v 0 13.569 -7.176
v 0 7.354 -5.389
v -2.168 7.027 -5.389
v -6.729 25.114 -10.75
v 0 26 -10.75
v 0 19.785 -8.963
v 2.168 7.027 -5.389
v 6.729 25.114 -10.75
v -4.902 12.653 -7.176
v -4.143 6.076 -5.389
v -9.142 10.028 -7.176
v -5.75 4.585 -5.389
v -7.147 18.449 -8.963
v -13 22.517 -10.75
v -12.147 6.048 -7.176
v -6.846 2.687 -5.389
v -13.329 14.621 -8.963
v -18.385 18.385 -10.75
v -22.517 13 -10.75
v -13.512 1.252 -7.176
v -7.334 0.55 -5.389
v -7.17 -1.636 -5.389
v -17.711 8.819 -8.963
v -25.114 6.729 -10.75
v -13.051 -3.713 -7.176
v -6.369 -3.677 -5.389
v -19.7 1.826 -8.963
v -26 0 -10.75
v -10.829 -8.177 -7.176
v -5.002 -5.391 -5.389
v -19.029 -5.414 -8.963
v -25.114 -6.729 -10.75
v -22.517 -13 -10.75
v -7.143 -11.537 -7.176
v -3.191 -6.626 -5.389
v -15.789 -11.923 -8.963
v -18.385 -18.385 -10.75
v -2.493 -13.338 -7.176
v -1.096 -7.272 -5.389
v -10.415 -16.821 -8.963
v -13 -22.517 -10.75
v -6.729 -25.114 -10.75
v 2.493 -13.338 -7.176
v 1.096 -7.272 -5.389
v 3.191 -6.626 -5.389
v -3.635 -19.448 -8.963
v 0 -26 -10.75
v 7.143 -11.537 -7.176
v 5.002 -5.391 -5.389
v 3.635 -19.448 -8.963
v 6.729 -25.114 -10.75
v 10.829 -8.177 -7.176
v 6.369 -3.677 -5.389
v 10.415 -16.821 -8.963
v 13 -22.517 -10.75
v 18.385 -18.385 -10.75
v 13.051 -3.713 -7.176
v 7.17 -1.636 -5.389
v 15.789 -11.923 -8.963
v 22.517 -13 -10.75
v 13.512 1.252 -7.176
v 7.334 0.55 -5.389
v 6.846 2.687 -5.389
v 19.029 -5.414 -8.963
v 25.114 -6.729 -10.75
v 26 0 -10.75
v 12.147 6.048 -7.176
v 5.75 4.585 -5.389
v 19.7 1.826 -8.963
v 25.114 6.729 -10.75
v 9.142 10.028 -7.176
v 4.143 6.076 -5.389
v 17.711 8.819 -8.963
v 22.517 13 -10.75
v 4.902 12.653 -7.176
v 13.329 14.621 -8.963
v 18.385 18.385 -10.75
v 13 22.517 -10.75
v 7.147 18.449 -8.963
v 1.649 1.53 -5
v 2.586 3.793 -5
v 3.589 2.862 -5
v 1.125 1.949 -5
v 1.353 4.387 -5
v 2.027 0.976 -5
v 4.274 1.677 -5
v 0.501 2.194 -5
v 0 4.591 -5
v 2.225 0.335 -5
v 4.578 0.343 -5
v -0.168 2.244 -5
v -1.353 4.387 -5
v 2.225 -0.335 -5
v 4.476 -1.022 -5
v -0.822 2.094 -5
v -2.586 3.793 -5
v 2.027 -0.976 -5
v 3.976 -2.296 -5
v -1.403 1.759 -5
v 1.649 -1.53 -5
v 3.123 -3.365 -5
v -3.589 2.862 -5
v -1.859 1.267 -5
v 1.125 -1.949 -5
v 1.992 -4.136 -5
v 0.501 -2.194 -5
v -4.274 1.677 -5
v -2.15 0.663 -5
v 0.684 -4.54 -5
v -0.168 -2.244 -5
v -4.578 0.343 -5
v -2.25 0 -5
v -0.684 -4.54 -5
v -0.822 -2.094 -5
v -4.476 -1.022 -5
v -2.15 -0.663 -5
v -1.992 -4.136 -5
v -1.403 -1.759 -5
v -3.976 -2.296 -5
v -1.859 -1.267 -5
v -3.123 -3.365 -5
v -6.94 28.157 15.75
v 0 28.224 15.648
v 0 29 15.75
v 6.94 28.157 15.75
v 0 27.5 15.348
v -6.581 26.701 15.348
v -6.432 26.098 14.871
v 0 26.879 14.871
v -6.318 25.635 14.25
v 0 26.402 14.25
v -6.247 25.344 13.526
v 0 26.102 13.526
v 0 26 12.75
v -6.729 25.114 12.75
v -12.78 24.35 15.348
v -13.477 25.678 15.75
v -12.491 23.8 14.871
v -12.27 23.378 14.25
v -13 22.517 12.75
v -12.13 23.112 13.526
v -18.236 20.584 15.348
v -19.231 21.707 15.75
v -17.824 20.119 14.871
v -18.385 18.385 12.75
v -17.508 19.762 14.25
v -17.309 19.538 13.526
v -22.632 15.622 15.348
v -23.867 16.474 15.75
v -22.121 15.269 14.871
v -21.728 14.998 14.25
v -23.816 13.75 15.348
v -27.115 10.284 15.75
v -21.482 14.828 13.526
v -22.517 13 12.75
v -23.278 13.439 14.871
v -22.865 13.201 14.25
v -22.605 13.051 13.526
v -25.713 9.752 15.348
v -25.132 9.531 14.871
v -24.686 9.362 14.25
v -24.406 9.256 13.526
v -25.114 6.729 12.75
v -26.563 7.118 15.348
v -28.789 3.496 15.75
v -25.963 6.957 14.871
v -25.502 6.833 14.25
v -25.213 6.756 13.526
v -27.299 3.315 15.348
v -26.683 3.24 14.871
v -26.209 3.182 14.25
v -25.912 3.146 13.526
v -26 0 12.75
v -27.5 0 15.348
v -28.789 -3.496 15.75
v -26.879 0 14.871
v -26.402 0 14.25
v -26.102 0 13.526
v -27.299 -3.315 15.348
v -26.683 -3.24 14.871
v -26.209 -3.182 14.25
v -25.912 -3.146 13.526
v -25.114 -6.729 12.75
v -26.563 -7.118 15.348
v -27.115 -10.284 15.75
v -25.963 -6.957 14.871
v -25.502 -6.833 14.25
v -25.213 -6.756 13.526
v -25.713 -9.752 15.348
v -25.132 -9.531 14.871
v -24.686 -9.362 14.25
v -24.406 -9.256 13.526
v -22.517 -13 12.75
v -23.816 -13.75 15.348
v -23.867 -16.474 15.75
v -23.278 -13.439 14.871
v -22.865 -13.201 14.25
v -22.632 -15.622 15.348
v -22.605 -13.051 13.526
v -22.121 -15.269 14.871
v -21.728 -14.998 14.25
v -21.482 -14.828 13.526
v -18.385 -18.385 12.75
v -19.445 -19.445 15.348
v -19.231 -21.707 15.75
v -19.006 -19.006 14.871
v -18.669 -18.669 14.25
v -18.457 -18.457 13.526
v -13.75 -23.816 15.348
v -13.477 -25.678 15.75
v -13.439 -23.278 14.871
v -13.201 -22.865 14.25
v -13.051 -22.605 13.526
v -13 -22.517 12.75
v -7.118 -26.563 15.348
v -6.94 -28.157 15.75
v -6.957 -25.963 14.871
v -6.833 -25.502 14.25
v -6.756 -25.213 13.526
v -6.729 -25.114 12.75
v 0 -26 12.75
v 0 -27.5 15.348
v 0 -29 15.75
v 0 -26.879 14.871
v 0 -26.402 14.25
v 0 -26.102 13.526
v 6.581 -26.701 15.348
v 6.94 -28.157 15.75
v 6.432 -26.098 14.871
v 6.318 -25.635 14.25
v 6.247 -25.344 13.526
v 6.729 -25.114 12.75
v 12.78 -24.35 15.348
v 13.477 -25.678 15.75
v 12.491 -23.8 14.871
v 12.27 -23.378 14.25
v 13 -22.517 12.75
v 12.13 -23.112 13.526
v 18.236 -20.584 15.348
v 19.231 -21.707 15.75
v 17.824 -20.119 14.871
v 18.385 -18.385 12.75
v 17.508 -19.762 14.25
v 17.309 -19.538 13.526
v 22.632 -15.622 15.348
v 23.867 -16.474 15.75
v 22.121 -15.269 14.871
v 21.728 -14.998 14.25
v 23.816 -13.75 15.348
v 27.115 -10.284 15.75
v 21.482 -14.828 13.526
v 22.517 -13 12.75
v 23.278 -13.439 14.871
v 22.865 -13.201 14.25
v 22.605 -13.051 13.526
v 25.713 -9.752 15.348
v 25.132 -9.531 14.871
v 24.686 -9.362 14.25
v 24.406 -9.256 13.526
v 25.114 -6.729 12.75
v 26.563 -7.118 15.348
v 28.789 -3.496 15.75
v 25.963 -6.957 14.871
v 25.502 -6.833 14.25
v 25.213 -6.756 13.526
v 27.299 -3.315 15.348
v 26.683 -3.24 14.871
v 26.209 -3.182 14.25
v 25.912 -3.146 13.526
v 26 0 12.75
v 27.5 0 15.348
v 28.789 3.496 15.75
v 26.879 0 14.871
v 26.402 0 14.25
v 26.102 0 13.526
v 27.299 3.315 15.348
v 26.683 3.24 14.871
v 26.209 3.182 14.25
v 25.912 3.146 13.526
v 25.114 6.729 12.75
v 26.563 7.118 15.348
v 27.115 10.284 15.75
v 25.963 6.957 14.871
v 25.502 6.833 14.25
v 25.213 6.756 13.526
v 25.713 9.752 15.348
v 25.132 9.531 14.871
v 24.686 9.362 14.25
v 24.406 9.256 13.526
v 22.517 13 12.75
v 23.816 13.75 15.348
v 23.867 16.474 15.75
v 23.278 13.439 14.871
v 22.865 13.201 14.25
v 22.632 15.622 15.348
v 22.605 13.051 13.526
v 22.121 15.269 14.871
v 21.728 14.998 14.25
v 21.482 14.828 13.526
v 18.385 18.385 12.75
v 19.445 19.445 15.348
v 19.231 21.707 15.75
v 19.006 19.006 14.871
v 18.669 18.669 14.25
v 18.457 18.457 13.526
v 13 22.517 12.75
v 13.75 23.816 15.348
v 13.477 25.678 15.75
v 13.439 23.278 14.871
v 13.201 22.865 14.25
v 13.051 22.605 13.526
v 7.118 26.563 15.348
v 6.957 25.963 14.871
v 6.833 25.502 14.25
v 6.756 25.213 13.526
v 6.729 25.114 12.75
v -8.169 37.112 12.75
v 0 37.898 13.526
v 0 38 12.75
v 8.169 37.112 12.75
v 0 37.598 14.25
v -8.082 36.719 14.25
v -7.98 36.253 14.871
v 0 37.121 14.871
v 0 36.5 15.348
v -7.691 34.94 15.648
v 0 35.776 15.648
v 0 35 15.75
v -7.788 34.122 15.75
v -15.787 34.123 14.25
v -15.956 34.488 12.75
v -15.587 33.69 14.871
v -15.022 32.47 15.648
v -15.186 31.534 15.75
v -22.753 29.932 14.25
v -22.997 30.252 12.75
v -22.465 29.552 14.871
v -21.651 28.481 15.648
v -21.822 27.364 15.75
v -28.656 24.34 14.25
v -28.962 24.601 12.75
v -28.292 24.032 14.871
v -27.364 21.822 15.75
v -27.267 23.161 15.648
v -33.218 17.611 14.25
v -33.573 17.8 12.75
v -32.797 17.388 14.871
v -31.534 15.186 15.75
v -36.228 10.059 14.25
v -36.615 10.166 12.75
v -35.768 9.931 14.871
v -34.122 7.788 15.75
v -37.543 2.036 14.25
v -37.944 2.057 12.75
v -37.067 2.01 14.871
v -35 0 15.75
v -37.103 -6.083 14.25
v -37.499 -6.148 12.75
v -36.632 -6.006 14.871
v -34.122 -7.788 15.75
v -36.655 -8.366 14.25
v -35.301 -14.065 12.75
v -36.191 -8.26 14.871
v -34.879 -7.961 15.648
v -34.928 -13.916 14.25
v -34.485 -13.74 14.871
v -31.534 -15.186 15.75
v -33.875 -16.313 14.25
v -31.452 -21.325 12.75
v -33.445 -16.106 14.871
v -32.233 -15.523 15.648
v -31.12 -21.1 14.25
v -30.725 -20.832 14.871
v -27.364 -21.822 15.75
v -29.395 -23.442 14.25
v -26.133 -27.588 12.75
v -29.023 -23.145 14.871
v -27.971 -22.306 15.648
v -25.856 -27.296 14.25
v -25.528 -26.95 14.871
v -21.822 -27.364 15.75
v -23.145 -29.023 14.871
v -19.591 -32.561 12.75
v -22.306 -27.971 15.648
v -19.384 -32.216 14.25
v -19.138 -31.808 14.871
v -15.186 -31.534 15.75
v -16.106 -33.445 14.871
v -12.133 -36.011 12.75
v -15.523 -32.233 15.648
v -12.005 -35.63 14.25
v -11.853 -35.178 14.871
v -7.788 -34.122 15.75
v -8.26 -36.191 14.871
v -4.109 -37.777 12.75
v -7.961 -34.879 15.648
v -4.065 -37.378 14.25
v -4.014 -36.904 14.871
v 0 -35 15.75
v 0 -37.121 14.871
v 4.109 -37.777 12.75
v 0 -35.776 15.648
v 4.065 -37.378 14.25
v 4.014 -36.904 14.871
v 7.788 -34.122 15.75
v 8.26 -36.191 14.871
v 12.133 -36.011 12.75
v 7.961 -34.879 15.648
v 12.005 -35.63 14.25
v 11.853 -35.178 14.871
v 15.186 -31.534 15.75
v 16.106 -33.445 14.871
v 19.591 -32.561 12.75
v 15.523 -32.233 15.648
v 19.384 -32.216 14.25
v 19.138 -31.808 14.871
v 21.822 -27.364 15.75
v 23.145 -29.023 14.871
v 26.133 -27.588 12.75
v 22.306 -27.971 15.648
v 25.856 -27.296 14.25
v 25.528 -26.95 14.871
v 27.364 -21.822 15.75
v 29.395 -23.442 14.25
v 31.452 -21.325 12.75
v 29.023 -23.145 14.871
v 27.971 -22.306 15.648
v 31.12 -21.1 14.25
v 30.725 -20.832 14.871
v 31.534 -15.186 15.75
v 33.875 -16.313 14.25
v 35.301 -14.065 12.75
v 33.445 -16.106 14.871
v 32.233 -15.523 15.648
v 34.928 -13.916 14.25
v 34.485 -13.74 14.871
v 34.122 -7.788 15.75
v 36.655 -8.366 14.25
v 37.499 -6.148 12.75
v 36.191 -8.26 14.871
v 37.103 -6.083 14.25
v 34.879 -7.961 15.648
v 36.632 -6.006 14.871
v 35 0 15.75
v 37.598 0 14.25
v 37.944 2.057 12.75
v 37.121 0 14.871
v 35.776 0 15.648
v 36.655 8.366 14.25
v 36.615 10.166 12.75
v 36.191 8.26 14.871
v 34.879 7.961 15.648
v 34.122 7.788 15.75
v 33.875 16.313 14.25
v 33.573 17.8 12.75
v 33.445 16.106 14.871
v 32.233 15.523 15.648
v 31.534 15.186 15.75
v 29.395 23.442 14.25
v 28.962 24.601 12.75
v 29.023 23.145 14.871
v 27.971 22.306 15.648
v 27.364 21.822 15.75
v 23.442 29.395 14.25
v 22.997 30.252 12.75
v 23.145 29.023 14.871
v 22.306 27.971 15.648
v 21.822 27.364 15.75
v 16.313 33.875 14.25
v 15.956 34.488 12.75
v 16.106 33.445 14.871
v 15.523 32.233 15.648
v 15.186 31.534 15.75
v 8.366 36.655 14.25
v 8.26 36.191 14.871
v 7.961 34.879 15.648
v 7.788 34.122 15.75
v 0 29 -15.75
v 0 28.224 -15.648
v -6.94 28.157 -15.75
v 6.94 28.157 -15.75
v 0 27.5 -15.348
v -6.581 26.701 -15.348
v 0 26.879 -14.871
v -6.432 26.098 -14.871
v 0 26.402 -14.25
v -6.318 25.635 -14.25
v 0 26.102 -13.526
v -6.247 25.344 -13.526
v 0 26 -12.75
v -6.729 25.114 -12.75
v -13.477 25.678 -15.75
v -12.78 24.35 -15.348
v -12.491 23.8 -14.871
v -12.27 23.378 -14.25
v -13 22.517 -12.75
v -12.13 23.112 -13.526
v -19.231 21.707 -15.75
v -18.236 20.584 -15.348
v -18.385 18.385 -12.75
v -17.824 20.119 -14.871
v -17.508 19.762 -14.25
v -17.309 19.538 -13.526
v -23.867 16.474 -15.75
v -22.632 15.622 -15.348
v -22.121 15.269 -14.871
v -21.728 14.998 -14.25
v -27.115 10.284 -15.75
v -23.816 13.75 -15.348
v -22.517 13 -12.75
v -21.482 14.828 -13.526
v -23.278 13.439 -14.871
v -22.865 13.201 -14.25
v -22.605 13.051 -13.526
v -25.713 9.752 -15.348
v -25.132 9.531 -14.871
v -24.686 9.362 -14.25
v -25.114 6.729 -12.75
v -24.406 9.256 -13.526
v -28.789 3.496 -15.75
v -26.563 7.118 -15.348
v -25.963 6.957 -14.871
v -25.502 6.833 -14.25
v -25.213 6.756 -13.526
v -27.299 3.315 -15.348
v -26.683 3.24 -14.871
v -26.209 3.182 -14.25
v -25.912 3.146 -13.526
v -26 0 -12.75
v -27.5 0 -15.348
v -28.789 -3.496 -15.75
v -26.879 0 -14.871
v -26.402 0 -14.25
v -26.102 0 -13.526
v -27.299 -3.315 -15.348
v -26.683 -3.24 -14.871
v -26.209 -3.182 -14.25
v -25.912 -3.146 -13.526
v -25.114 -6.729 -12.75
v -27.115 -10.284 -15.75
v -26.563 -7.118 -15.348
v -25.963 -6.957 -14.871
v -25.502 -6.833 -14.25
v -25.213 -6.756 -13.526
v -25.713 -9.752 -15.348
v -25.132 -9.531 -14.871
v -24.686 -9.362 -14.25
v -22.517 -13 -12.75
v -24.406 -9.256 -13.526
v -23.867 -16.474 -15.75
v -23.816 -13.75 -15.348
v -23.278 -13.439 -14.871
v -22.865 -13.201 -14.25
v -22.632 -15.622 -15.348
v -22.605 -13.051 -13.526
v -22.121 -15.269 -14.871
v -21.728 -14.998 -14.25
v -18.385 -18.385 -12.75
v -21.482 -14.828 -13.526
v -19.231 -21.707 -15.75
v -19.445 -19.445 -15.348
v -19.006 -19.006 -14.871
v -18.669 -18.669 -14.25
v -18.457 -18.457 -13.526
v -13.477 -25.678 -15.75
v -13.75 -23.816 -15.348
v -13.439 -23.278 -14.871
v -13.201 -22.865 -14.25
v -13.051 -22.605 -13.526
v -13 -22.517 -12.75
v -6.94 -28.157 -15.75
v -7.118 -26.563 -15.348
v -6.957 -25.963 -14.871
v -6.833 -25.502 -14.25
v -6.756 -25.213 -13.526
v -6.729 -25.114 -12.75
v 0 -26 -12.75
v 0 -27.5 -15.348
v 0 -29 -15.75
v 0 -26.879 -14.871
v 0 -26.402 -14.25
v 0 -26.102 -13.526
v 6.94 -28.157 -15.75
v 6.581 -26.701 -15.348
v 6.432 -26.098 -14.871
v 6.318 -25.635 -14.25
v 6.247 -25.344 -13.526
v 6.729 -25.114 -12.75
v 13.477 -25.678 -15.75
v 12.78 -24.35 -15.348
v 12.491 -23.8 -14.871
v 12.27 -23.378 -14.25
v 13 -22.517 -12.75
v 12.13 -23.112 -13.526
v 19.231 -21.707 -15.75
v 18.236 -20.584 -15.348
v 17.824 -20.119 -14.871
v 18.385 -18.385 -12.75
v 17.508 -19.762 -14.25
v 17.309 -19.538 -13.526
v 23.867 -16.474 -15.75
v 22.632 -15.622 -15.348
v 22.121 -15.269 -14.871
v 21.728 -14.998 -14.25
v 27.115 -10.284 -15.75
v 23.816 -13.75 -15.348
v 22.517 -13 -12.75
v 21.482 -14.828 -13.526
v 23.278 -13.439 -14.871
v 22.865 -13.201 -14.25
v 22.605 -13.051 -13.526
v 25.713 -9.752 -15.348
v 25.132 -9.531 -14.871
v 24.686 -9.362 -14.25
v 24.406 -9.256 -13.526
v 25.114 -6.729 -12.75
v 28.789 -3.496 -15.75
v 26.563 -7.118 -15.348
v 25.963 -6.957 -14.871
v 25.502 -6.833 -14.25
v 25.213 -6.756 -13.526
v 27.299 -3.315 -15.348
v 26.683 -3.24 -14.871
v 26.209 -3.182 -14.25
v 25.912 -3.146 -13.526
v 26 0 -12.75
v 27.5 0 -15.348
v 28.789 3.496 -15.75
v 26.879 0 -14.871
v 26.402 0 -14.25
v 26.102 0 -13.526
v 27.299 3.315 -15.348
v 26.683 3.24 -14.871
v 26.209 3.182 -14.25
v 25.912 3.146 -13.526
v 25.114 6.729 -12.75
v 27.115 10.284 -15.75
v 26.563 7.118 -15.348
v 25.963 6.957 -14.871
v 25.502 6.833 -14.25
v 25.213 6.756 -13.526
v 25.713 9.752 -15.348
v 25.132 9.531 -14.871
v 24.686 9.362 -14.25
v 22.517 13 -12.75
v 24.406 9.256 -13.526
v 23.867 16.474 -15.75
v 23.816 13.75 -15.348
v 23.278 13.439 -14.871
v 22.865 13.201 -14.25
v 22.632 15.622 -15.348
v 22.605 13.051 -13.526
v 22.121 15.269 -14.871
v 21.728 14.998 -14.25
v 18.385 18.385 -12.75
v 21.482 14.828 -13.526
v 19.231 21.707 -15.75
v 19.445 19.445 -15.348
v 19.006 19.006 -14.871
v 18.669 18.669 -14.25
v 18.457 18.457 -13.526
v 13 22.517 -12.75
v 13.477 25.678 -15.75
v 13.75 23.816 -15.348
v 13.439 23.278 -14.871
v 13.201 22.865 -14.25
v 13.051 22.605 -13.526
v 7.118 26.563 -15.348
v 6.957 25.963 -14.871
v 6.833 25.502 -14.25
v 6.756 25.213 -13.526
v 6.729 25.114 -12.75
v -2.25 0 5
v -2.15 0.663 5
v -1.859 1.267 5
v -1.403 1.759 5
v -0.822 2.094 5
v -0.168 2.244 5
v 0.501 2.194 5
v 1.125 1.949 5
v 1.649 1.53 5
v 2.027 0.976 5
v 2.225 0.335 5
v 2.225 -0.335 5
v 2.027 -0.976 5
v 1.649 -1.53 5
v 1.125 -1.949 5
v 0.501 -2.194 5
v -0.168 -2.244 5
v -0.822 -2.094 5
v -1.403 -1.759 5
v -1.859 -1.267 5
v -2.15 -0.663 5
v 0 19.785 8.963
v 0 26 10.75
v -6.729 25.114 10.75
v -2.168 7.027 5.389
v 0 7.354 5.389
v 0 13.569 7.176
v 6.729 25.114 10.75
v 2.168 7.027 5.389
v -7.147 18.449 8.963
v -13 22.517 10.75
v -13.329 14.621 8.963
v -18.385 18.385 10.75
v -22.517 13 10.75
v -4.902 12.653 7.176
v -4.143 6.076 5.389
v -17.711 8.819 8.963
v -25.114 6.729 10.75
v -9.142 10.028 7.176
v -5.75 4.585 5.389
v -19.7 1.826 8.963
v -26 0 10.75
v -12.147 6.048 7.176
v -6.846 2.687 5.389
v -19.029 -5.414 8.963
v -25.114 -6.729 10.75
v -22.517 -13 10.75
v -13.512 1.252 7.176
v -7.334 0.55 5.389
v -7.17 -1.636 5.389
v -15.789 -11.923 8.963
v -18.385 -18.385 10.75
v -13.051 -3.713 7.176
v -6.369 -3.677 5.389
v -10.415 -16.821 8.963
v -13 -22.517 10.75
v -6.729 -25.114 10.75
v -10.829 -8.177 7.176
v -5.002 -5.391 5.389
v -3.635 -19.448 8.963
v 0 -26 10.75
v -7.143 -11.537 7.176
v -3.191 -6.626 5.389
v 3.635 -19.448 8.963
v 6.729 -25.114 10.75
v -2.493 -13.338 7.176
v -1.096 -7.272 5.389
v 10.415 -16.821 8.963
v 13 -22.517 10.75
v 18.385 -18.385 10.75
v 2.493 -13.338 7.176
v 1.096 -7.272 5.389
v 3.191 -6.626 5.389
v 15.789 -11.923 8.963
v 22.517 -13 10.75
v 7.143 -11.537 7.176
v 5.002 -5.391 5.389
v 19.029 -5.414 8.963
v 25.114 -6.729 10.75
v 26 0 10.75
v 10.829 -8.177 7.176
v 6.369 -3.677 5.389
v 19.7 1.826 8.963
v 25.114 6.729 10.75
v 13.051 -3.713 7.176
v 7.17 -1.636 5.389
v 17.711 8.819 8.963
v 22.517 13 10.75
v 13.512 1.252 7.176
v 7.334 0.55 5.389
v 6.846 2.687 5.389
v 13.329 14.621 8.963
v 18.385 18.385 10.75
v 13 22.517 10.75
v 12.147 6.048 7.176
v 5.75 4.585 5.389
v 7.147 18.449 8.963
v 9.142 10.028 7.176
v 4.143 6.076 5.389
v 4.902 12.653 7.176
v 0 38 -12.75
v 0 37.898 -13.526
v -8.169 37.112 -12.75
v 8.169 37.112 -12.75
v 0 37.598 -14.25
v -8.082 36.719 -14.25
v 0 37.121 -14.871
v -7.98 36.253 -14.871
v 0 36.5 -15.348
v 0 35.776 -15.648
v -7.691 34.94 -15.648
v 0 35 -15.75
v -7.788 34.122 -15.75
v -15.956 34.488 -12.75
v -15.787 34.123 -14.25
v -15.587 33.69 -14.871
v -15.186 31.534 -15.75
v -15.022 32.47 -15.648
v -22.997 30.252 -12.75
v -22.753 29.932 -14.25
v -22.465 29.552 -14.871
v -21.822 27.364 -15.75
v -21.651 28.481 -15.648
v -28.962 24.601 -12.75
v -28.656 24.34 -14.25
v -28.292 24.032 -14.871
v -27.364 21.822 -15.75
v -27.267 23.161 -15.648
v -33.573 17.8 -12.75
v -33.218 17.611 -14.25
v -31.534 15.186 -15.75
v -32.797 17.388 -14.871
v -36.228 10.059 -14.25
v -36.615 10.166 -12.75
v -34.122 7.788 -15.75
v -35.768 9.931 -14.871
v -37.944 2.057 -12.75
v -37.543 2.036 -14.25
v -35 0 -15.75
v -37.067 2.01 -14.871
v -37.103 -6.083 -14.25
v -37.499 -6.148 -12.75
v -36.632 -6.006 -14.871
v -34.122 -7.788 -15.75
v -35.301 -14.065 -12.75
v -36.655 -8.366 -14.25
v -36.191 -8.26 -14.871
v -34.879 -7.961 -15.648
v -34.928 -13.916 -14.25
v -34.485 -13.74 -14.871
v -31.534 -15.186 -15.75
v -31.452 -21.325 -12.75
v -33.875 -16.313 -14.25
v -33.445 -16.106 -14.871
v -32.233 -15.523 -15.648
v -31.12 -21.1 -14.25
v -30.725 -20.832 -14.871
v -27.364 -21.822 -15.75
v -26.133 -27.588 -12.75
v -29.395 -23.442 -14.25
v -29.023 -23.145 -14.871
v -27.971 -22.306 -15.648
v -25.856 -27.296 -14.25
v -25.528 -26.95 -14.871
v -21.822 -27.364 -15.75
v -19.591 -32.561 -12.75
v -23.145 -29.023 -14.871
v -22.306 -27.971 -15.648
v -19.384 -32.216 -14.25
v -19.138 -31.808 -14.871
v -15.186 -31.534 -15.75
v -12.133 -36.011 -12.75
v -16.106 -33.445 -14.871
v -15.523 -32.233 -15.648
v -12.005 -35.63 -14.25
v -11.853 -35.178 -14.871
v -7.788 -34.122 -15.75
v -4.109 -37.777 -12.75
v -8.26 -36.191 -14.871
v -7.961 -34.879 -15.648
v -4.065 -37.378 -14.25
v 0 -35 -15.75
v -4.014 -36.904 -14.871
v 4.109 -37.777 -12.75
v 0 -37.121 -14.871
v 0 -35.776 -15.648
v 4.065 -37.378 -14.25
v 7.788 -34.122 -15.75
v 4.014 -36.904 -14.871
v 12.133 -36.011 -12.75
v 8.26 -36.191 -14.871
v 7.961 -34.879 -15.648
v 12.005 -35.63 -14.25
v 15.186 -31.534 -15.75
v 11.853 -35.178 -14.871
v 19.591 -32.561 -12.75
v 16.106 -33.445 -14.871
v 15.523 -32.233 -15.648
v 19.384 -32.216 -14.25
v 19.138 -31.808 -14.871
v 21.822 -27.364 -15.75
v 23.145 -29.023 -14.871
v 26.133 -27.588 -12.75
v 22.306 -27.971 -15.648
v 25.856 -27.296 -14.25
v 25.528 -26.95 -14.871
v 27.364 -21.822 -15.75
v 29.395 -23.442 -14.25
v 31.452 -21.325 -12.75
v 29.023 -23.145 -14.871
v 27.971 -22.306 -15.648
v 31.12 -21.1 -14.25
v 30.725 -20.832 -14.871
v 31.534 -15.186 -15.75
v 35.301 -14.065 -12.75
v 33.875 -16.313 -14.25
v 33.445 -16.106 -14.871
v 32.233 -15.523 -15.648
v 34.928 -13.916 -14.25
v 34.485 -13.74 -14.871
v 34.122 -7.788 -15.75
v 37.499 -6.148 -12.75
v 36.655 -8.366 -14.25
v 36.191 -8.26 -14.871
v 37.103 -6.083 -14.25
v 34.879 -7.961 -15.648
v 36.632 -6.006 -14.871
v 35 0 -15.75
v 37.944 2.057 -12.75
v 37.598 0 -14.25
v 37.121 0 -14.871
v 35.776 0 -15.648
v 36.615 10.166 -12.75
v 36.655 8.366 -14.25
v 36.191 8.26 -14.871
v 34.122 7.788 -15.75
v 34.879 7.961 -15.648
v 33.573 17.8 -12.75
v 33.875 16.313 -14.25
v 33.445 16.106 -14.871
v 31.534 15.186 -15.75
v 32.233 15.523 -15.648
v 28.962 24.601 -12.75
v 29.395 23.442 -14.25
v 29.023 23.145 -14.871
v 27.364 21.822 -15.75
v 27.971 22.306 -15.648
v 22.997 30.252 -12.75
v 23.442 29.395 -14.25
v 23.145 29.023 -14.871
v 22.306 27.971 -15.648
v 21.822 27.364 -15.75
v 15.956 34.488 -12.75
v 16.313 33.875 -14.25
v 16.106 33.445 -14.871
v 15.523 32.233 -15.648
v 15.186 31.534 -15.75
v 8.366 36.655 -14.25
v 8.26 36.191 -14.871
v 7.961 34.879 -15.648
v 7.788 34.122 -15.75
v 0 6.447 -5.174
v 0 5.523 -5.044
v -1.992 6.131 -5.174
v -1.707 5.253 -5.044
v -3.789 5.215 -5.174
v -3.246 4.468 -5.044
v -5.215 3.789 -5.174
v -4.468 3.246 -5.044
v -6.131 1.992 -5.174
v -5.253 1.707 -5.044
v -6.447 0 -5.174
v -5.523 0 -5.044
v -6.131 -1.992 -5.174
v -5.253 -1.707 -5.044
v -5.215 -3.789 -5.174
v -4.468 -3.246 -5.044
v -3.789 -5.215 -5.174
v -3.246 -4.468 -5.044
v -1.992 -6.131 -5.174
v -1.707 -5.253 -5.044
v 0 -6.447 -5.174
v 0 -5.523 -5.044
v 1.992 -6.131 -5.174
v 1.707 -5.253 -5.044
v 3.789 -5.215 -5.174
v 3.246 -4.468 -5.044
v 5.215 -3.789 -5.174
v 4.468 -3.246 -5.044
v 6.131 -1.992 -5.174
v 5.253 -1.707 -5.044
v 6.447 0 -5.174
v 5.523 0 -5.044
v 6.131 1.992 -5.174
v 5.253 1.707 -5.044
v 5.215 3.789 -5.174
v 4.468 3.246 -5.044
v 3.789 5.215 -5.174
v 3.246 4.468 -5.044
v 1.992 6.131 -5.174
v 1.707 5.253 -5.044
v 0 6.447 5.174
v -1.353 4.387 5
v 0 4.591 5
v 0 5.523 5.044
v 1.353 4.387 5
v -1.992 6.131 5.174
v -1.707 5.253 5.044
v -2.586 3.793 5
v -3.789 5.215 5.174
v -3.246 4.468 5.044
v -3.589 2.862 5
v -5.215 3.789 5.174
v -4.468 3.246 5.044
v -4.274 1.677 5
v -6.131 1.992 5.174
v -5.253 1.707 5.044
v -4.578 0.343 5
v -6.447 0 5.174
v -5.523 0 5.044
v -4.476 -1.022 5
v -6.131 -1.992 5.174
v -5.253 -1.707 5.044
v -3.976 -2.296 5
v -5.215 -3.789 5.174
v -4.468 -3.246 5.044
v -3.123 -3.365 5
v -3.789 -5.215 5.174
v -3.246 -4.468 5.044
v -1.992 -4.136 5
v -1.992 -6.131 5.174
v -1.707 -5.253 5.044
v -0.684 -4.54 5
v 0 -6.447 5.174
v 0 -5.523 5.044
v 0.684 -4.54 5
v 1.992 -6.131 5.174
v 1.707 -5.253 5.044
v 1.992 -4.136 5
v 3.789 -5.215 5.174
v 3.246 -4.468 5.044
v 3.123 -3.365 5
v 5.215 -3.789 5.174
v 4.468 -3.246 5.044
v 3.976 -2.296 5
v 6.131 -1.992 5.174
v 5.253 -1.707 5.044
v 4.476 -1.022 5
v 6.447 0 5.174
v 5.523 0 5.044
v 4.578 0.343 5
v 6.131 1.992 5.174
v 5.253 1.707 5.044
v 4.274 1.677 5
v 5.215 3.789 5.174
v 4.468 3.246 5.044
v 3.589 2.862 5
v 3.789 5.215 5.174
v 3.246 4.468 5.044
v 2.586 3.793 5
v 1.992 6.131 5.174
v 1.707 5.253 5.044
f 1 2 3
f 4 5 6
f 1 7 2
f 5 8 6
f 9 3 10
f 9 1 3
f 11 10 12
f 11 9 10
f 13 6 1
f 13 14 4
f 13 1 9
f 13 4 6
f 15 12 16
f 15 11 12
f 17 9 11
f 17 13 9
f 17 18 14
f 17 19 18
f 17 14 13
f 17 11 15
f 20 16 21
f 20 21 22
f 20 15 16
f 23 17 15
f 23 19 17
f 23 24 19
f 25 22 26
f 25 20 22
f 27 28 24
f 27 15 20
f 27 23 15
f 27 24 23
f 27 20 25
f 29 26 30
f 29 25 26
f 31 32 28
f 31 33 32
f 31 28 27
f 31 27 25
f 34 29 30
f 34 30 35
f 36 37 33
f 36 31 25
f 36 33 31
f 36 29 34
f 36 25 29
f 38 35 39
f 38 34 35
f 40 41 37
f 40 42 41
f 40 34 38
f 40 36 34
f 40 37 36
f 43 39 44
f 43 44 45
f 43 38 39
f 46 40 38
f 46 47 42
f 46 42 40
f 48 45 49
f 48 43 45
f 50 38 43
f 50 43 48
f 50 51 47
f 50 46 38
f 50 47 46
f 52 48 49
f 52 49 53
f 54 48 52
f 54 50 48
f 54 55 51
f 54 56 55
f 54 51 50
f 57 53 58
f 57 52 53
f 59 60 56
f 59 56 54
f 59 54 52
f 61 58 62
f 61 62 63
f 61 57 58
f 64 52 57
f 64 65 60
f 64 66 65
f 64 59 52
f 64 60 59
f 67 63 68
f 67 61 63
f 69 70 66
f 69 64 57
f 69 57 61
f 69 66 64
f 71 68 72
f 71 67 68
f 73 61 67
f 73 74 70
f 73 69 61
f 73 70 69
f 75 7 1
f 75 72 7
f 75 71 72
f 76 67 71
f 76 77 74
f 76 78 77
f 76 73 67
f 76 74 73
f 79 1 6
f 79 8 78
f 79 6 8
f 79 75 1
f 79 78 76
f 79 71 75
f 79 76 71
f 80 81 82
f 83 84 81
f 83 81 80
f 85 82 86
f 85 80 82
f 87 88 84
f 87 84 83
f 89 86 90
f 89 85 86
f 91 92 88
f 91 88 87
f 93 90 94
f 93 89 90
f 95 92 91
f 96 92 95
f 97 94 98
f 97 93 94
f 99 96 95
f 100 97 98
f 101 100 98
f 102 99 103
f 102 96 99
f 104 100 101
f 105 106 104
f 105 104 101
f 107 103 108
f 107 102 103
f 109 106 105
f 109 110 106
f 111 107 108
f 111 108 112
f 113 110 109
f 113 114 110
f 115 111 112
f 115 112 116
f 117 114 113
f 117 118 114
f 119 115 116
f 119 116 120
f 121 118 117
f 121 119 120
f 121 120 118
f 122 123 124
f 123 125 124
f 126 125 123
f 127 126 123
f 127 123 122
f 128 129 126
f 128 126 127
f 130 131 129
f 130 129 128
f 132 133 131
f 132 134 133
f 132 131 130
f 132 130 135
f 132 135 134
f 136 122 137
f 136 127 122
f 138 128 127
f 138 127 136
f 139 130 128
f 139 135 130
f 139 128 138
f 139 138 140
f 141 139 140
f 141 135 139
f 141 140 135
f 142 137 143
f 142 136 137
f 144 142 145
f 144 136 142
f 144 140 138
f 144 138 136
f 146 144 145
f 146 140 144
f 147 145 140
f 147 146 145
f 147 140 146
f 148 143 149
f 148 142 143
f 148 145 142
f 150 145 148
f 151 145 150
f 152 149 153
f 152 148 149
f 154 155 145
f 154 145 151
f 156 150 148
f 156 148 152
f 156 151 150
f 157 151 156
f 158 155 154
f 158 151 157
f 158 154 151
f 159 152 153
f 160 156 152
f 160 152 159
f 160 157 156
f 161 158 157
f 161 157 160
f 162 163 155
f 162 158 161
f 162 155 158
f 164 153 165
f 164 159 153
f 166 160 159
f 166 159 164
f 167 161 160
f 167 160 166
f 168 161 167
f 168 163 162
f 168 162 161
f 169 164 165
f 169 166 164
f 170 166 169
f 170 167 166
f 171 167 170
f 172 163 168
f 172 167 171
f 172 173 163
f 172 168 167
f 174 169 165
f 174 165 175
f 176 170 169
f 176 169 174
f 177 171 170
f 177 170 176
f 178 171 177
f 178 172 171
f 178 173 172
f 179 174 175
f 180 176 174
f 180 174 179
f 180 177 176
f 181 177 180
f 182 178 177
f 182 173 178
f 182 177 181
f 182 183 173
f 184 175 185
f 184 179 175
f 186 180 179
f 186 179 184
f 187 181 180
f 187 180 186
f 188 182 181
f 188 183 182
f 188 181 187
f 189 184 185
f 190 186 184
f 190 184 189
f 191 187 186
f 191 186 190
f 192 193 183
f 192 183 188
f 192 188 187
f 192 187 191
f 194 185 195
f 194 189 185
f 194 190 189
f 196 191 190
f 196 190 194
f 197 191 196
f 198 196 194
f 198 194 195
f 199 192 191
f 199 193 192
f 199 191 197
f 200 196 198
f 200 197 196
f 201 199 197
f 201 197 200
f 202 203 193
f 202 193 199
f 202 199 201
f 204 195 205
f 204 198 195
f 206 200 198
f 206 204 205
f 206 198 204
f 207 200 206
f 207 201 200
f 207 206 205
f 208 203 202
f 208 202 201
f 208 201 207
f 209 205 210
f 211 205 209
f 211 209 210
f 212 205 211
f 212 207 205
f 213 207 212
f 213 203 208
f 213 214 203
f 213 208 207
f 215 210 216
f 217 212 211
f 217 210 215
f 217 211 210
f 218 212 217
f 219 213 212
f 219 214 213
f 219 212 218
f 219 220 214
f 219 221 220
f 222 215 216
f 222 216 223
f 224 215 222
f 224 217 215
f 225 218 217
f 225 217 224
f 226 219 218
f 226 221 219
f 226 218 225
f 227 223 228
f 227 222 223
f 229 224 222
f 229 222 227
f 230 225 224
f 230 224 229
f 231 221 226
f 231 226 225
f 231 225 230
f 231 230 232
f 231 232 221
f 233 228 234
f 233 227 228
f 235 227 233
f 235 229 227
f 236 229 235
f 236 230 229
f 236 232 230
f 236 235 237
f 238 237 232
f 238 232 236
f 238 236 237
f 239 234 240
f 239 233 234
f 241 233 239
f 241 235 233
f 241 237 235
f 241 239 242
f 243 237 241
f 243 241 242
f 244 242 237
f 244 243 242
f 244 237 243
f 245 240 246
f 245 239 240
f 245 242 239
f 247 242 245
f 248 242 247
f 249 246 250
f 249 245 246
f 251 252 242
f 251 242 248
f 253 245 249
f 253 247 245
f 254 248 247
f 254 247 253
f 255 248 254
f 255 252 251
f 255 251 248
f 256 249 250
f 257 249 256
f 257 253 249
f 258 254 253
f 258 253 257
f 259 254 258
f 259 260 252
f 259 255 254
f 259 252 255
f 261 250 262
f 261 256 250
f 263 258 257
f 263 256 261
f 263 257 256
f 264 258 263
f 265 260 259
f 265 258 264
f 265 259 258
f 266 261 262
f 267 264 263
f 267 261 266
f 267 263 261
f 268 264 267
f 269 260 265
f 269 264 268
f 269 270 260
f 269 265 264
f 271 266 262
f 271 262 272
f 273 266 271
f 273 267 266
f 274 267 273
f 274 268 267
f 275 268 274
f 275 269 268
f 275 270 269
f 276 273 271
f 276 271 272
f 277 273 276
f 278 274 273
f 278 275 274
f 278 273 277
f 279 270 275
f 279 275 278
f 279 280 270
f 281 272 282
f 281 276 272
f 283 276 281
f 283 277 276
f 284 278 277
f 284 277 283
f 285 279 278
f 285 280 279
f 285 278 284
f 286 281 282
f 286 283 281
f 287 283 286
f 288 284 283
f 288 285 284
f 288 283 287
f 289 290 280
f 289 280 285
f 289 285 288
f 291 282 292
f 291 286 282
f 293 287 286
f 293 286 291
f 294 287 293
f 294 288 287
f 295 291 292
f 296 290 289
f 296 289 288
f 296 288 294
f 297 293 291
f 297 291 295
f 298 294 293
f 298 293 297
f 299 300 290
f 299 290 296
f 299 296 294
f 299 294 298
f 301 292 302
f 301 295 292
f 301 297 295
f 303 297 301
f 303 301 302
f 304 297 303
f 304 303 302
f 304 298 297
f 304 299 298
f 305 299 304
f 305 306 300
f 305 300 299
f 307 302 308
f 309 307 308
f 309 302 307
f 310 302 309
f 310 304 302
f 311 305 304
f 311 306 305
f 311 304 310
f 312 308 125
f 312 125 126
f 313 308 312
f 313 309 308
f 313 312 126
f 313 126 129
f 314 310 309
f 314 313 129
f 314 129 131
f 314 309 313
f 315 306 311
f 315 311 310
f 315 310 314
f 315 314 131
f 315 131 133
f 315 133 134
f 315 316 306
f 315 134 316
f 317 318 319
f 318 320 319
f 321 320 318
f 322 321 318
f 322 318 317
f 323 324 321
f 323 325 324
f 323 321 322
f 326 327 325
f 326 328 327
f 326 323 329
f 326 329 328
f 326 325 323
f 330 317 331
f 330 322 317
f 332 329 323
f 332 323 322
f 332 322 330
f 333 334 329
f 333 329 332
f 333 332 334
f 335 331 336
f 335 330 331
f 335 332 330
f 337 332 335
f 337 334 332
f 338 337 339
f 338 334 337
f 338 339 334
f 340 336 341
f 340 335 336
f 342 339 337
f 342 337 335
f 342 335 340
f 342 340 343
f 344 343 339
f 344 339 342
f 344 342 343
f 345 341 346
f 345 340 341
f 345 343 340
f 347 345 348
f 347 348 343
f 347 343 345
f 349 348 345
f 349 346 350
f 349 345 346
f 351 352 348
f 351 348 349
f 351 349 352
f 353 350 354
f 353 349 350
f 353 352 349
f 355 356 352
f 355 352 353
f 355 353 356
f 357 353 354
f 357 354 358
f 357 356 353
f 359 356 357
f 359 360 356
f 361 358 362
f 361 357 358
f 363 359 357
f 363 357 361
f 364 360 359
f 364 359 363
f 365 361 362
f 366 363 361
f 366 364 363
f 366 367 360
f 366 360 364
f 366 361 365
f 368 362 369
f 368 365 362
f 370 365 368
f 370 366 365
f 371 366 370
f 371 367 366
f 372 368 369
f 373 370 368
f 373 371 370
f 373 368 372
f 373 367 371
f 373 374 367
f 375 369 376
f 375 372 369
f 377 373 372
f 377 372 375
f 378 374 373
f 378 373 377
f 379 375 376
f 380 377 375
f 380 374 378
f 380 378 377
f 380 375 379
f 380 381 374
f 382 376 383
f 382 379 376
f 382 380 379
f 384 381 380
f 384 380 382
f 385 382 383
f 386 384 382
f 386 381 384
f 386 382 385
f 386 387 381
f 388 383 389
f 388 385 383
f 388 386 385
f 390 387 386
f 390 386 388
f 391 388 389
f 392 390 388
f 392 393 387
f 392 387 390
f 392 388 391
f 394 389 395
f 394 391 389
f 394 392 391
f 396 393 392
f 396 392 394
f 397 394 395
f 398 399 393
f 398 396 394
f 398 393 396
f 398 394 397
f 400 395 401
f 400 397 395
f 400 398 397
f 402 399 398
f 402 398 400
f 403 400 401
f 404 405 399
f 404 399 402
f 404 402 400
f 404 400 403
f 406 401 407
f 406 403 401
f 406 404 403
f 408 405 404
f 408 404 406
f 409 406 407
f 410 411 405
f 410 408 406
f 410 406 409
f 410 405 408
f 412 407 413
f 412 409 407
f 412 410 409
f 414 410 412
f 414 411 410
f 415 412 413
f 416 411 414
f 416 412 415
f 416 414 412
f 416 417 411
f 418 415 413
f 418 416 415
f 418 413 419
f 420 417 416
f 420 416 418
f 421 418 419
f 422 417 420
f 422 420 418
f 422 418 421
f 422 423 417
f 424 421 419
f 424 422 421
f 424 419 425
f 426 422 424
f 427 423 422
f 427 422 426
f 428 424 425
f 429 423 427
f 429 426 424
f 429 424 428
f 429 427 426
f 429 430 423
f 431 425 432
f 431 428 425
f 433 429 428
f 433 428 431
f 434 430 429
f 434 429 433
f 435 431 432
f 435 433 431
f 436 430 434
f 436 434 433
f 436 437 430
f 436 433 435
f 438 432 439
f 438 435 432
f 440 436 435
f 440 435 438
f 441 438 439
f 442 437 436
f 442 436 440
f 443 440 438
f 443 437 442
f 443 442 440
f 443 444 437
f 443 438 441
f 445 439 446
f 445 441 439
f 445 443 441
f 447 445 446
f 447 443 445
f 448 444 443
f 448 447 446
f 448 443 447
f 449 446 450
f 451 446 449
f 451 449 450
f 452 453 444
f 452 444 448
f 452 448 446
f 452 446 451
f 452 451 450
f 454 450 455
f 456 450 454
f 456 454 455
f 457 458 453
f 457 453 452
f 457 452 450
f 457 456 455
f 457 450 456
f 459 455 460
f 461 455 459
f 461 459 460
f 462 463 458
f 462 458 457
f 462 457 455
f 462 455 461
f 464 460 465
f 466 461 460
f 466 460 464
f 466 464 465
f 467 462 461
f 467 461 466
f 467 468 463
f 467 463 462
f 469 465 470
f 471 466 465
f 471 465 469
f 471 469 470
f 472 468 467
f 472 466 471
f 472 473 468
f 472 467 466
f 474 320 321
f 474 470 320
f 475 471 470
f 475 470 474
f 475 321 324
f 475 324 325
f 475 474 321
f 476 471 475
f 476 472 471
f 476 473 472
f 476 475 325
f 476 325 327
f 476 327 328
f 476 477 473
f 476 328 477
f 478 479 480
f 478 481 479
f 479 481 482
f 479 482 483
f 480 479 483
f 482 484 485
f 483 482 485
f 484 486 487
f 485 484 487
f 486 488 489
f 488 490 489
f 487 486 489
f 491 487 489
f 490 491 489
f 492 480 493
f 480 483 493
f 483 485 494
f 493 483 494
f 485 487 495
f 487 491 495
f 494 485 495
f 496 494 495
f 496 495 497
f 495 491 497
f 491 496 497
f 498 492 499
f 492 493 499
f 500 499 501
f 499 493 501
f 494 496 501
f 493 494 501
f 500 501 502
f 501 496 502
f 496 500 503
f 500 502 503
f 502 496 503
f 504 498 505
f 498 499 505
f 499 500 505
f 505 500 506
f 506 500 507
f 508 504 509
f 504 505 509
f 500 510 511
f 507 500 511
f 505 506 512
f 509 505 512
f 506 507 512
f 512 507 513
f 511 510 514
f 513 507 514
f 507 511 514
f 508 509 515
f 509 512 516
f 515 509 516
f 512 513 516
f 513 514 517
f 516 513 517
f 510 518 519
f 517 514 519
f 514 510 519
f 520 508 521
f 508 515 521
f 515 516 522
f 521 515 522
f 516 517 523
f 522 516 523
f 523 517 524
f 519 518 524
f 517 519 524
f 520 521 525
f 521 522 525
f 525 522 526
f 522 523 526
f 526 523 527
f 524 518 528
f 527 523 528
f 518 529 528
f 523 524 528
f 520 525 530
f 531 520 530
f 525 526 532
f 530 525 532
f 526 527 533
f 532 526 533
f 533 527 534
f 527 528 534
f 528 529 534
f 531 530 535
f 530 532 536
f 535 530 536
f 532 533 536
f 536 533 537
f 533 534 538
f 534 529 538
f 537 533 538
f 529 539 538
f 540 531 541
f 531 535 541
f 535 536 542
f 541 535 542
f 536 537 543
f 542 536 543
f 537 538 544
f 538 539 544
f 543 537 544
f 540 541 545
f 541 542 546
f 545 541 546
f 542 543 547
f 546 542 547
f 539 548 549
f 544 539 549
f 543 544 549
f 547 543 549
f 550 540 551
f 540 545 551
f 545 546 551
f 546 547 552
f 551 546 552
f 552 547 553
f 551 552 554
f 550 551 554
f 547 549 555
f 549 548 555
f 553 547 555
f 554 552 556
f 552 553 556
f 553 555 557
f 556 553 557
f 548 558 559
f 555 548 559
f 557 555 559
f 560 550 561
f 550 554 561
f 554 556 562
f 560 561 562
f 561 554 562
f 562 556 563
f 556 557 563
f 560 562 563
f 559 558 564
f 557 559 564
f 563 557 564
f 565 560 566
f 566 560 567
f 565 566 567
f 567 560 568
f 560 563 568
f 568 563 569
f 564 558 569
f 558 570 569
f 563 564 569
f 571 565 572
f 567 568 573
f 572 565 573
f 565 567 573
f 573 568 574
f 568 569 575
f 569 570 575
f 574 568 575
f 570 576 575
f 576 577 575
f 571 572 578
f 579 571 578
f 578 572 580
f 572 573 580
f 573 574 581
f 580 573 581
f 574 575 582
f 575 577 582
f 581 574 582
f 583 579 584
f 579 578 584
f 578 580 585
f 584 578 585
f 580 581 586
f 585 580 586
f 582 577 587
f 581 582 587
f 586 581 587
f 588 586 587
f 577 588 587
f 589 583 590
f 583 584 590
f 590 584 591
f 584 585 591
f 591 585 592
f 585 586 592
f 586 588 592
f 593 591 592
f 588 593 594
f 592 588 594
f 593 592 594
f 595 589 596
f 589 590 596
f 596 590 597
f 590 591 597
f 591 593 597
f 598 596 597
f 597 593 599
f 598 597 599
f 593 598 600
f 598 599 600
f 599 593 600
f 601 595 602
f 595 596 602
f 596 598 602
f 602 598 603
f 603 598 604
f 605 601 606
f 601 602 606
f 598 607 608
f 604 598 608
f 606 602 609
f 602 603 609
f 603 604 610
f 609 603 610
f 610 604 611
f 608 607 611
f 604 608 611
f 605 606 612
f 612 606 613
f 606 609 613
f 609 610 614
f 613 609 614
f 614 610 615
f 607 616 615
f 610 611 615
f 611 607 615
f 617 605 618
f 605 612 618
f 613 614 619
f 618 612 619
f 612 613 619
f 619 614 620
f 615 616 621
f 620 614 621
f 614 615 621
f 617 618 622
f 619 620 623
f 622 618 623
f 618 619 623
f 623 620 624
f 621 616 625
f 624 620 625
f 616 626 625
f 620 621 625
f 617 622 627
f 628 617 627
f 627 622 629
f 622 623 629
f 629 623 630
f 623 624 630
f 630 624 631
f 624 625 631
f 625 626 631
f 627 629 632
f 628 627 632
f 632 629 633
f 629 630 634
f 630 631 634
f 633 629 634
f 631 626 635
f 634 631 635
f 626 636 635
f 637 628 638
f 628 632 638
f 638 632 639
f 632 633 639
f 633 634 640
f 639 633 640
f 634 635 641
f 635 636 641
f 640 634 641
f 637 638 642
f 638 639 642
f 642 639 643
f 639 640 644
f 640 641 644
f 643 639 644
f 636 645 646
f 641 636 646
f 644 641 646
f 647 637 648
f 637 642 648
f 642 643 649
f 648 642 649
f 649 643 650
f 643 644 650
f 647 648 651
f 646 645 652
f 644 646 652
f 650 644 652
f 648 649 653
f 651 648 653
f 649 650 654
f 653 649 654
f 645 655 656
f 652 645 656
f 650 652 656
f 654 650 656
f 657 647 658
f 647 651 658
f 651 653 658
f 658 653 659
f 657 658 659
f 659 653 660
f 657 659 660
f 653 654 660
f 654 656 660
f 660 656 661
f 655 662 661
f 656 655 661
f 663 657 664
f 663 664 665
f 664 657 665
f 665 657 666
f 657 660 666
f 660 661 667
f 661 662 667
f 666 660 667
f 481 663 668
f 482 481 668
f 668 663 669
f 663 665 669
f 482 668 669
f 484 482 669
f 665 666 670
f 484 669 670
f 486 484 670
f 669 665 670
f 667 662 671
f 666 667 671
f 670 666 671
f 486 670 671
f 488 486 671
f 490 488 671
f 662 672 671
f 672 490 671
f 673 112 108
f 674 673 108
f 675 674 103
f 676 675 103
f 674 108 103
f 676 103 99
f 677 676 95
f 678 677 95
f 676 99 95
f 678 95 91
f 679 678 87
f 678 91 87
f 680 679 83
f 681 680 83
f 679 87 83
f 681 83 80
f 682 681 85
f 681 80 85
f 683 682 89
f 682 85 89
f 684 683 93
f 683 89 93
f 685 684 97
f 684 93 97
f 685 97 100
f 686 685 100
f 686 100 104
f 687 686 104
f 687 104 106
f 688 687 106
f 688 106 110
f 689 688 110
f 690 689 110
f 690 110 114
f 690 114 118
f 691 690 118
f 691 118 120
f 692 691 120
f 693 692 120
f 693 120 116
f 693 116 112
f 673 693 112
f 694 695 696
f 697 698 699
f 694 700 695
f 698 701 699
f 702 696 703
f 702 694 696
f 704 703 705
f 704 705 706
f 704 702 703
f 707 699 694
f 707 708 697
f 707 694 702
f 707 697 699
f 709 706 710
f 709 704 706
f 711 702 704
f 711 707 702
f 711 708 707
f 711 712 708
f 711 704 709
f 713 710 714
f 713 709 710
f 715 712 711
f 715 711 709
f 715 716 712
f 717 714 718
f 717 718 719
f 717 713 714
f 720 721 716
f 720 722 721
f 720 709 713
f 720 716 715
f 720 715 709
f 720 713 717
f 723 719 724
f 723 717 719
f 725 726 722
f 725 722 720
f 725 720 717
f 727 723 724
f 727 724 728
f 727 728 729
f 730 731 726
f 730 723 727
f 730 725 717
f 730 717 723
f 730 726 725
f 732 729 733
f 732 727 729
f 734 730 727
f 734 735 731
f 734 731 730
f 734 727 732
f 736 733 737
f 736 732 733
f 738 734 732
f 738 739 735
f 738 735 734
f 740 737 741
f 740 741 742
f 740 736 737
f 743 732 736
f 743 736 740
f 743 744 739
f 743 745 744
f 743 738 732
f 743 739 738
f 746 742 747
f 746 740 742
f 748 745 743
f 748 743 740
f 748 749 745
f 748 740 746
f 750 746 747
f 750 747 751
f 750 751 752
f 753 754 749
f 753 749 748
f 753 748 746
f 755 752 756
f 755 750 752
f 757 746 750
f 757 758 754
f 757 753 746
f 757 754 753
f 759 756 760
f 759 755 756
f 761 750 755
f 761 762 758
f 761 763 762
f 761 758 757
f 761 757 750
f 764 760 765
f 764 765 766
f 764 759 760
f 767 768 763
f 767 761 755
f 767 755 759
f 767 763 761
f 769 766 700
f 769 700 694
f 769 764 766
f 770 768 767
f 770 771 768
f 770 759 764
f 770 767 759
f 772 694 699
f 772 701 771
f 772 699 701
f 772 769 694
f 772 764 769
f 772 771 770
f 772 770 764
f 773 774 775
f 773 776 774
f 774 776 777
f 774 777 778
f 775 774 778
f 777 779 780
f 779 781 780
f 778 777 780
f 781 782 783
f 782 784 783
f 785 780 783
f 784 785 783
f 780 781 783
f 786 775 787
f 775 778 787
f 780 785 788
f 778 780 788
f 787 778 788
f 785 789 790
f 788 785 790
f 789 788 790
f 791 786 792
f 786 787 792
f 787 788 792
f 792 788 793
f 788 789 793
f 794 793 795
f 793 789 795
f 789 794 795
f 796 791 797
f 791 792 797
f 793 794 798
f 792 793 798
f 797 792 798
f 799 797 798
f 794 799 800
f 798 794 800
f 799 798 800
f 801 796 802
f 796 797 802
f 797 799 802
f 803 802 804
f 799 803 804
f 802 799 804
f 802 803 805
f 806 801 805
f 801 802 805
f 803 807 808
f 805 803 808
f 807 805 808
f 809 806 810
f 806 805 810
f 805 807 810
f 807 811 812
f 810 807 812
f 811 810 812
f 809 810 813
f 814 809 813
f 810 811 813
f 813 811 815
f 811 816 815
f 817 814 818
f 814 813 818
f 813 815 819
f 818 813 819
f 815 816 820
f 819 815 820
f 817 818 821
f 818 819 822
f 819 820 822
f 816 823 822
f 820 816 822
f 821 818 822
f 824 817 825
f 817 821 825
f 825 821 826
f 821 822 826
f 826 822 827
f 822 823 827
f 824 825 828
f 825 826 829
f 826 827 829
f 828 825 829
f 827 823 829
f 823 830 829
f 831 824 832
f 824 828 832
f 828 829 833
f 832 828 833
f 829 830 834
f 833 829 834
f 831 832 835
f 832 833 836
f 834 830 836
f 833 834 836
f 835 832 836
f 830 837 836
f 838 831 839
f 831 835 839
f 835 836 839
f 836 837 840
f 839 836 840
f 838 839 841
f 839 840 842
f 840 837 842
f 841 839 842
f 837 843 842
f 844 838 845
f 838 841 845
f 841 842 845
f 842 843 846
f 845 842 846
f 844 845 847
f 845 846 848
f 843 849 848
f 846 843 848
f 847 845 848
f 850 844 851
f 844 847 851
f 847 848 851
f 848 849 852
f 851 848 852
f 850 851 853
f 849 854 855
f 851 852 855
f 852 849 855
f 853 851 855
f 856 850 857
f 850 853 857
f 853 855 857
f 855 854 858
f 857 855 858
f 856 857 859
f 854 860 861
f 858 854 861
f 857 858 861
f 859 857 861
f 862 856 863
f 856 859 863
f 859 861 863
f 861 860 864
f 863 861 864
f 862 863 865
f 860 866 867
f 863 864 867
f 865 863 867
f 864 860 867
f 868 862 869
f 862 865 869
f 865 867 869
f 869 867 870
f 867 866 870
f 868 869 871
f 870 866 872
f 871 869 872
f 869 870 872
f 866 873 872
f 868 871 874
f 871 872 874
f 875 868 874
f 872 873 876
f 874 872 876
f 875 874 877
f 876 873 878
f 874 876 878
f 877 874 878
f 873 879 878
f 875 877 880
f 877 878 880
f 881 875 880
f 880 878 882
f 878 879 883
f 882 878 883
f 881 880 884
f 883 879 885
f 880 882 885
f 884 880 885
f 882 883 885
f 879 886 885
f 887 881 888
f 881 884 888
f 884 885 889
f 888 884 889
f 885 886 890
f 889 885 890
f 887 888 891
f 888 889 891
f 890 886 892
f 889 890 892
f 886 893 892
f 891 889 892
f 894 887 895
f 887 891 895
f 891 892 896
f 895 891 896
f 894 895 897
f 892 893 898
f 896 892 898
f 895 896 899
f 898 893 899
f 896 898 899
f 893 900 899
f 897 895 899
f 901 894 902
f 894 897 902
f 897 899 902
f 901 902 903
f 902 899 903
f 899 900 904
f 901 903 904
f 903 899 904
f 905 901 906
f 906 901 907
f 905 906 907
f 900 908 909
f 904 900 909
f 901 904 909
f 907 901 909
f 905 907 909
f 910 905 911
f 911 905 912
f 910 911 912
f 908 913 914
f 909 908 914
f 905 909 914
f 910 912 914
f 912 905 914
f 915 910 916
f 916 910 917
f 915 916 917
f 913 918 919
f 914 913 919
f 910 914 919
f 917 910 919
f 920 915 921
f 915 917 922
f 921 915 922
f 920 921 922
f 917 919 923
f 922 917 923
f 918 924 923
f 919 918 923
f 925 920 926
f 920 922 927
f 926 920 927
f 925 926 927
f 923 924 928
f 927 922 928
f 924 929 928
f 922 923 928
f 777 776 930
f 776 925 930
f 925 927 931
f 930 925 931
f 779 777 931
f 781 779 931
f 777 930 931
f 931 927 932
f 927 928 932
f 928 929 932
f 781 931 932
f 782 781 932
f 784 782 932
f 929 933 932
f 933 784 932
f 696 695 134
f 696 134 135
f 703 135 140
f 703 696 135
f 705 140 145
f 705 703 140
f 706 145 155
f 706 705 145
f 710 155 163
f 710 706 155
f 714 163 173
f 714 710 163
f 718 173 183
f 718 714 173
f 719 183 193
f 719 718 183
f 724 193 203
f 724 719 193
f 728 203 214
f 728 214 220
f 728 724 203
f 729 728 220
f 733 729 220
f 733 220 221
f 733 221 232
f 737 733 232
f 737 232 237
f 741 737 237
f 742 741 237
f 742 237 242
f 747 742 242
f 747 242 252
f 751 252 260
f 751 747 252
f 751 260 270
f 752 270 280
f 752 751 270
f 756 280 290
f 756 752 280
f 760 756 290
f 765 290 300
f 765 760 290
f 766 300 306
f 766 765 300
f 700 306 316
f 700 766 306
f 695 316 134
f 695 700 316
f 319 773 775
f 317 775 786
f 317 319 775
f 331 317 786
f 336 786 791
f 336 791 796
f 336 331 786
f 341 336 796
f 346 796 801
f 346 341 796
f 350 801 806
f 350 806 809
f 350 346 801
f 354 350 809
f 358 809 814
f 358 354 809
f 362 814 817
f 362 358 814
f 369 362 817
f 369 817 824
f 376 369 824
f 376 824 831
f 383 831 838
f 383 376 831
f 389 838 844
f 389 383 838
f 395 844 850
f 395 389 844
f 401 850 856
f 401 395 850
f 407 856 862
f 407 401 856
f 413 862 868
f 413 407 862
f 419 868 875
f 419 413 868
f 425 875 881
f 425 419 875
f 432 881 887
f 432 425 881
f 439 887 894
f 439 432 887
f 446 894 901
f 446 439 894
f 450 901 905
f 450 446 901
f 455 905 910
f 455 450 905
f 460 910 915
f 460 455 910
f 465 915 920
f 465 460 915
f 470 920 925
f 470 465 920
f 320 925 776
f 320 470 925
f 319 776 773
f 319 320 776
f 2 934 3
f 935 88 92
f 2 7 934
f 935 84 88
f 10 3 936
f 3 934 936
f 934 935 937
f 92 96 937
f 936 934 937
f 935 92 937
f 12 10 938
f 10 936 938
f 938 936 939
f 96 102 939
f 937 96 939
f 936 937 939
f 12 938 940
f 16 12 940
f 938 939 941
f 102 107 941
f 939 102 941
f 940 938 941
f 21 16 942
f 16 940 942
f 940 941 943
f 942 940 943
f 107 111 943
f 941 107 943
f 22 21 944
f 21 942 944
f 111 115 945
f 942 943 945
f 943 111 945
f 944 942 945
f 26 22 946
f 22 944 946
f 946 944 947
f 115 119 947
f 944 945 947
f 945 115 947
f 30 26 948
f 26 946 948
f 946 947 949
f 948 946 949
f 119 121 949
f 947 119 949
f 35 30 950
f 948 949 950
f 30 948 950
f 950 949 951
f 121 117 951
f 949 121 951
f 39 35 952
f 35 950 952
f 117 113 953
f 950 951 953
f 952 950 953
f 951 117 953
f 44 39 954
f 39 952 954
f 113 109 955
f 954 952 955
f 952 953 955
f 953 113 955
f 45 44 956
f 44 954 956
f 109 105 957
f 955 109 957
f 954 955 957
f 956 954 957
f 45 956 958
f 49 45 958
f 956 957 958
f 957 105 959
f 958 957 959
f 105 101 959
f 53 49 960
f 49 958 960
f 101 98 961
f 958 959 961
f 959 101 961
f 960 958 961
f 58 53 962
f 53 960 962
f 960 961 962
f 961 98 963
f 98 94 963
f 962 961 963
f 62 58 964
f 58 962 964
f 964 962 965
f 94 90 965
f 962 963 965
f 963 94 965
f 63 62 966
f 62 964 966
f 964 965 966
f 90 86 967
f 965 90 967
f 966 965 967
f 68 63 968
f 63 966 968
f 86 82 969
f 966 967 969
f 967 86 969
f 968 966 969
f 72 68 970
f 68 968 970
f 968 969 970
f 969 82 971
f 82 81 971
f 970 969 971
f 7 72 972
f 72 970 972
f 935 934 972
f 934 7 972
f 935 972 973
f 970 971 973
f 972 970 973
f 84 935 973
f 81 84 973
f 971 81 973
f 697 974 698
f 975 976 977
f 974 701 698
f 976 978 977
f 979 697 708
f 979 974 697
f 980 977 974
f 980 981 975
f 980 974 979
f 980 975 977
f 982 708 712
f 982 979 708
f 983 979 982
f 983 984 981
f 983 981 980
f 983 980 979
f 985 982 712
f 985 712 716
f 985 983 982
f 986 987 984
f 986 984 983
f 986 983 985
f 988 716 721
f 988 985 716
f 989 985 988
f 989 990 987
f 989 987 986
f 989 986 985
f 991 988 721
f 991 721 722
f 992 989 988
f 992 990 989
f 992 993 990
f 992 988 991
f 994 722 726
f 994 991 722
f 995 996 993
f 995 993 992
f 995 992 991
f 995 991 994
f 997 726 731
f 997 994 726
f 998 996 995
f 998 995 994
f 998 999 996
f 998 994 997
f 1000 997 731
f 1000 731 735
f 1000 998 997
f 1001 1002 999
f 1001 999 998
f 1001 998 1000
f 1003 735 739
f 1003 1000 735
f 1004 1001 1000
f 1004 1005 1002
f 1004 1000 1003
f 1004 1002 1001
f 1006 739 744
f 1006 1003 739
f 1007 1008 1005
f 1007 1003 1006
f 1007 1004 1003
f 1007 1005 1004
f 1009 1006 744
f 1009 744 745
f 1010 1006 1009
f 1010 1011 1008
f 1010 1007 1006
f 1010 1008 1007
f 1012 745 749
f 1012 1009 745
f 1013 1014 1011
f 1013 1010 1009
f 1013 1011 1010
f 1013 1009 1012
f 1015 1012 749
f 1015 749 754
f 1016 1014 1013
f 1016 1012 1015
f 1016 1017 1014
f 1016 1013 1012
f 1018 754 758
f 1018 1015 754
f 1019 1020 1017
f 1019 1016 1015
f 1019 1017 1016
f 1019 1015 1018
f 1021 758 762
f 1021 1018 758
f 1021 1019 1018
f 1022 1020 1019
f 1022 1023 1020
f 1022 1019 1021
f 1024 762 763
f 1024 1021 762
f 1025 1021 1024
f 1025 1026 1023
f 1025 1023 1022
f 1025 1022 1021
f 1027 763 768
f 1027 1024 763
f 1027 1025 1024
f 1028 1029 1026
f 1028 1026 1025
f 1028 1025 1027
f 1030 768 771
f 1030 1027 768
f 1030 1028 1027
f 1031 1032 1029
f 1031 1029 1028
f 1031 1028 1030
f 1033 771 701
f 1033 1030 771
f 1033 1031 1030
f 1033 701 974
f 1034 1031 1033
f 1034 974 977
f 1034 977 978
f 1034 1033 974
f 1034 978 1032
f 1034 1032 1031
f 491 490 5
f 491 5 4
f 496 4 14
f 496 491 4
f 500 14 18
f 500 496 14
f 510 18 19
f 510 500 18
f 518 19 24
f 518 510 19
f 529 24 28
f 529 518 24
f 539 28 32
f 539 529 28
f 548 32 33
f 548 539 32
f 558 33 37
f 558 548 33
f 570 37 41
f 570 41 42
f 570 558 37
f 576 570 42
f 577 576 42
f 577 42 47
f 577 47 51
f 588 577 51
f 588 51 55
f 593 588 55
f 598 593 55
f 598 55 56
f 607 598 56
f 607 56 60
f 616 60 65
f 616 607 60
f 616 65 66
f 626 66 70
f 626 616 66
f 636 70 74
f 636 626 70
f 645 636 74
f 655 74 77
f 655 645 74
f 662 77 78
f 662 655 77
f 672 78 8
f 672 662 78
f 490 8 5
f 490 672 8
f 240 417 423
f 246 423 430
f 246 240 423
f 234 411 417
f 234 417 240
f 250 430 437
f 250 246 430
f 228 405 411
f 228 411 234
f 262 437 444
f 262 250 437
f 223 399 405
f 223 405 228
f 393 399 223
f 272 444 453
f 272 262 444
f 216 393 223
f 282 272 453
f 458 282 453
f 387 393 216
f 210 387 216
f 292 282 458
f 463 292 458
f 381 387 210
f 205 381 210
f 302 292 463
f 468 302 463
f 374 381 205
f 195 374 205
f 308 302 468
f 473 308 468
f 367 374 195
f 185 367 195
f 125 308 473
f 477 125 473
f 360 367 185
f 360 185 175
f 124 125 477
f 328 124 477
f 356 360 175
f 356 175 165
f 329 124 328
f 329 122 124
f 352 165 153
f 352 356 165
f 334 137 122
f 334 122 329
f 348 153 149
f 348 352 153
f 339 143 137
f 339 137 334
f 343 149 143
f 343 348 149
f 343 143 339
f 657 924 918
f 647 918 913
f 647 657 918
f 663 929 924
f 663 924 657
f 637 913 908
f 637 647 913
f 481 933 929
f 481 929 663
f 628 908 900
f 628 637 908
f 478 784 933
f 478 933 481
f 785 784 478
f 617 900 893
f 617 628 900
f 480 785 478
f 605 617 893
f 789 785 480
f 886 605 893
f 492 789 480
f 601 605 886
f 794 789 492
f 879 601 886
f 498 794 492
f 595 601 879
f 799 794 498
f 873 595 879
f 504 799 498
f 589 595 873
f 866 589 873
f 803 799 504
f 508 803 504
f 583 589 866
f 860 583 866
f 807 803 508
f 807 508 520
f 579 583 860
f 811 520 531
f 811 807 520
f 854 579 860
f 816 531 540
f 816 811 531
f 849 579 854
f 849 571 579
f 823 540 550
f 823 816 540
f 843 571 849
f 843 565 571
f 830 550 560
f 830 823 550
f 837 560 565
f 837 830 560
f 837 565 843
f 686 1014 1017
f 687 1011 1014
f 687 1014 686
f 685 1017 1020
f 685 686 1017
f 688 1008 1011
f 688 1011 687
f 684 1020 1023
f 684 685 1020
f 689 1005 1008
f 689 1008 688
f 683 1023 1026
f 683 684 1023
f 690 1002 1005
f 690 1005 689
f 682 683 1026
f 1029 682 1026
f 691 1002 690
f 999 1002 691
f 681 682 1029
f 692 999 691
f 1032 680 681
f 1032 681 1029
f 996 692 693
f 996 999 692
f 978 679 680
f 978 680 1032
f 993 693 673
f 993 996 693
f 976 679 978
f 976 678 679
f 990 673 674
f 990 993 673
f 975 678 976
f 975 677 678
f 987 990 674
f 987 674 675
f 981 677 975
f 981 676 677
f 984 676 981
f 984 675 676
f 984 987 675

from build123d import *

# Parameters (mm, degrees)
CROQUIS2_R            = 2.25
CORTAR_EXTRUIR1_DEPTH = 21.75
REDONDEO1_R           = 3
REDONDEO2_R           = 10


with BuildPart() as part:
    # Croquis1 → Revolución4 (revolve)
    with BuildSketch(Plane(origin=(0, 0, 0), x_dir=(0, 0, -1), z_dir=(1, 0, 0))):
        Polygon((15.75, 38), (-15.75, 38), (-15.75, 26), (-10.75, 26), (-5, 6), (-5, 0), (5, 0), (5, 6), (10.75, 26), (15.75, 26), align=None)
    revolve(axis=Axis((0, 0, -5), (0, 0, 1)))

    # Croquis2 → Cortar-Extruir1 (cut, through all)
    with BuildSketch(Plane(origin=(0, 0, -5), x_dir=(-1, 0, 0), z_dir=(0, 0, -1))):
        Circle(CROQUIS2_R)
    extrude(amount=-CORTAR_EXTRUIR1_DEPTH, mode=Mode.SUBTRACT)

    # Redondeo1
    redondeo1_edges = [part.edges().sort_by_distance(p)[0] for p in [
        (0, -38, 15.75),
        (0, -26, 15.75),
        (0, -26, -15.75),
        (0, -38, -15.75),
    ]]
    fillet(redondeo1_edges, radius=REDONDEO1_R)

    # Redondeo2
    redondeo2_edges = [part.edges().sort_by_distance(p)[0] for p in [
        (0, -6, 5),
        (0, -6, -5),
    ]]
    fillet(redondeo2_edges, radius=REDONDEO2_R)


solid = part.part
